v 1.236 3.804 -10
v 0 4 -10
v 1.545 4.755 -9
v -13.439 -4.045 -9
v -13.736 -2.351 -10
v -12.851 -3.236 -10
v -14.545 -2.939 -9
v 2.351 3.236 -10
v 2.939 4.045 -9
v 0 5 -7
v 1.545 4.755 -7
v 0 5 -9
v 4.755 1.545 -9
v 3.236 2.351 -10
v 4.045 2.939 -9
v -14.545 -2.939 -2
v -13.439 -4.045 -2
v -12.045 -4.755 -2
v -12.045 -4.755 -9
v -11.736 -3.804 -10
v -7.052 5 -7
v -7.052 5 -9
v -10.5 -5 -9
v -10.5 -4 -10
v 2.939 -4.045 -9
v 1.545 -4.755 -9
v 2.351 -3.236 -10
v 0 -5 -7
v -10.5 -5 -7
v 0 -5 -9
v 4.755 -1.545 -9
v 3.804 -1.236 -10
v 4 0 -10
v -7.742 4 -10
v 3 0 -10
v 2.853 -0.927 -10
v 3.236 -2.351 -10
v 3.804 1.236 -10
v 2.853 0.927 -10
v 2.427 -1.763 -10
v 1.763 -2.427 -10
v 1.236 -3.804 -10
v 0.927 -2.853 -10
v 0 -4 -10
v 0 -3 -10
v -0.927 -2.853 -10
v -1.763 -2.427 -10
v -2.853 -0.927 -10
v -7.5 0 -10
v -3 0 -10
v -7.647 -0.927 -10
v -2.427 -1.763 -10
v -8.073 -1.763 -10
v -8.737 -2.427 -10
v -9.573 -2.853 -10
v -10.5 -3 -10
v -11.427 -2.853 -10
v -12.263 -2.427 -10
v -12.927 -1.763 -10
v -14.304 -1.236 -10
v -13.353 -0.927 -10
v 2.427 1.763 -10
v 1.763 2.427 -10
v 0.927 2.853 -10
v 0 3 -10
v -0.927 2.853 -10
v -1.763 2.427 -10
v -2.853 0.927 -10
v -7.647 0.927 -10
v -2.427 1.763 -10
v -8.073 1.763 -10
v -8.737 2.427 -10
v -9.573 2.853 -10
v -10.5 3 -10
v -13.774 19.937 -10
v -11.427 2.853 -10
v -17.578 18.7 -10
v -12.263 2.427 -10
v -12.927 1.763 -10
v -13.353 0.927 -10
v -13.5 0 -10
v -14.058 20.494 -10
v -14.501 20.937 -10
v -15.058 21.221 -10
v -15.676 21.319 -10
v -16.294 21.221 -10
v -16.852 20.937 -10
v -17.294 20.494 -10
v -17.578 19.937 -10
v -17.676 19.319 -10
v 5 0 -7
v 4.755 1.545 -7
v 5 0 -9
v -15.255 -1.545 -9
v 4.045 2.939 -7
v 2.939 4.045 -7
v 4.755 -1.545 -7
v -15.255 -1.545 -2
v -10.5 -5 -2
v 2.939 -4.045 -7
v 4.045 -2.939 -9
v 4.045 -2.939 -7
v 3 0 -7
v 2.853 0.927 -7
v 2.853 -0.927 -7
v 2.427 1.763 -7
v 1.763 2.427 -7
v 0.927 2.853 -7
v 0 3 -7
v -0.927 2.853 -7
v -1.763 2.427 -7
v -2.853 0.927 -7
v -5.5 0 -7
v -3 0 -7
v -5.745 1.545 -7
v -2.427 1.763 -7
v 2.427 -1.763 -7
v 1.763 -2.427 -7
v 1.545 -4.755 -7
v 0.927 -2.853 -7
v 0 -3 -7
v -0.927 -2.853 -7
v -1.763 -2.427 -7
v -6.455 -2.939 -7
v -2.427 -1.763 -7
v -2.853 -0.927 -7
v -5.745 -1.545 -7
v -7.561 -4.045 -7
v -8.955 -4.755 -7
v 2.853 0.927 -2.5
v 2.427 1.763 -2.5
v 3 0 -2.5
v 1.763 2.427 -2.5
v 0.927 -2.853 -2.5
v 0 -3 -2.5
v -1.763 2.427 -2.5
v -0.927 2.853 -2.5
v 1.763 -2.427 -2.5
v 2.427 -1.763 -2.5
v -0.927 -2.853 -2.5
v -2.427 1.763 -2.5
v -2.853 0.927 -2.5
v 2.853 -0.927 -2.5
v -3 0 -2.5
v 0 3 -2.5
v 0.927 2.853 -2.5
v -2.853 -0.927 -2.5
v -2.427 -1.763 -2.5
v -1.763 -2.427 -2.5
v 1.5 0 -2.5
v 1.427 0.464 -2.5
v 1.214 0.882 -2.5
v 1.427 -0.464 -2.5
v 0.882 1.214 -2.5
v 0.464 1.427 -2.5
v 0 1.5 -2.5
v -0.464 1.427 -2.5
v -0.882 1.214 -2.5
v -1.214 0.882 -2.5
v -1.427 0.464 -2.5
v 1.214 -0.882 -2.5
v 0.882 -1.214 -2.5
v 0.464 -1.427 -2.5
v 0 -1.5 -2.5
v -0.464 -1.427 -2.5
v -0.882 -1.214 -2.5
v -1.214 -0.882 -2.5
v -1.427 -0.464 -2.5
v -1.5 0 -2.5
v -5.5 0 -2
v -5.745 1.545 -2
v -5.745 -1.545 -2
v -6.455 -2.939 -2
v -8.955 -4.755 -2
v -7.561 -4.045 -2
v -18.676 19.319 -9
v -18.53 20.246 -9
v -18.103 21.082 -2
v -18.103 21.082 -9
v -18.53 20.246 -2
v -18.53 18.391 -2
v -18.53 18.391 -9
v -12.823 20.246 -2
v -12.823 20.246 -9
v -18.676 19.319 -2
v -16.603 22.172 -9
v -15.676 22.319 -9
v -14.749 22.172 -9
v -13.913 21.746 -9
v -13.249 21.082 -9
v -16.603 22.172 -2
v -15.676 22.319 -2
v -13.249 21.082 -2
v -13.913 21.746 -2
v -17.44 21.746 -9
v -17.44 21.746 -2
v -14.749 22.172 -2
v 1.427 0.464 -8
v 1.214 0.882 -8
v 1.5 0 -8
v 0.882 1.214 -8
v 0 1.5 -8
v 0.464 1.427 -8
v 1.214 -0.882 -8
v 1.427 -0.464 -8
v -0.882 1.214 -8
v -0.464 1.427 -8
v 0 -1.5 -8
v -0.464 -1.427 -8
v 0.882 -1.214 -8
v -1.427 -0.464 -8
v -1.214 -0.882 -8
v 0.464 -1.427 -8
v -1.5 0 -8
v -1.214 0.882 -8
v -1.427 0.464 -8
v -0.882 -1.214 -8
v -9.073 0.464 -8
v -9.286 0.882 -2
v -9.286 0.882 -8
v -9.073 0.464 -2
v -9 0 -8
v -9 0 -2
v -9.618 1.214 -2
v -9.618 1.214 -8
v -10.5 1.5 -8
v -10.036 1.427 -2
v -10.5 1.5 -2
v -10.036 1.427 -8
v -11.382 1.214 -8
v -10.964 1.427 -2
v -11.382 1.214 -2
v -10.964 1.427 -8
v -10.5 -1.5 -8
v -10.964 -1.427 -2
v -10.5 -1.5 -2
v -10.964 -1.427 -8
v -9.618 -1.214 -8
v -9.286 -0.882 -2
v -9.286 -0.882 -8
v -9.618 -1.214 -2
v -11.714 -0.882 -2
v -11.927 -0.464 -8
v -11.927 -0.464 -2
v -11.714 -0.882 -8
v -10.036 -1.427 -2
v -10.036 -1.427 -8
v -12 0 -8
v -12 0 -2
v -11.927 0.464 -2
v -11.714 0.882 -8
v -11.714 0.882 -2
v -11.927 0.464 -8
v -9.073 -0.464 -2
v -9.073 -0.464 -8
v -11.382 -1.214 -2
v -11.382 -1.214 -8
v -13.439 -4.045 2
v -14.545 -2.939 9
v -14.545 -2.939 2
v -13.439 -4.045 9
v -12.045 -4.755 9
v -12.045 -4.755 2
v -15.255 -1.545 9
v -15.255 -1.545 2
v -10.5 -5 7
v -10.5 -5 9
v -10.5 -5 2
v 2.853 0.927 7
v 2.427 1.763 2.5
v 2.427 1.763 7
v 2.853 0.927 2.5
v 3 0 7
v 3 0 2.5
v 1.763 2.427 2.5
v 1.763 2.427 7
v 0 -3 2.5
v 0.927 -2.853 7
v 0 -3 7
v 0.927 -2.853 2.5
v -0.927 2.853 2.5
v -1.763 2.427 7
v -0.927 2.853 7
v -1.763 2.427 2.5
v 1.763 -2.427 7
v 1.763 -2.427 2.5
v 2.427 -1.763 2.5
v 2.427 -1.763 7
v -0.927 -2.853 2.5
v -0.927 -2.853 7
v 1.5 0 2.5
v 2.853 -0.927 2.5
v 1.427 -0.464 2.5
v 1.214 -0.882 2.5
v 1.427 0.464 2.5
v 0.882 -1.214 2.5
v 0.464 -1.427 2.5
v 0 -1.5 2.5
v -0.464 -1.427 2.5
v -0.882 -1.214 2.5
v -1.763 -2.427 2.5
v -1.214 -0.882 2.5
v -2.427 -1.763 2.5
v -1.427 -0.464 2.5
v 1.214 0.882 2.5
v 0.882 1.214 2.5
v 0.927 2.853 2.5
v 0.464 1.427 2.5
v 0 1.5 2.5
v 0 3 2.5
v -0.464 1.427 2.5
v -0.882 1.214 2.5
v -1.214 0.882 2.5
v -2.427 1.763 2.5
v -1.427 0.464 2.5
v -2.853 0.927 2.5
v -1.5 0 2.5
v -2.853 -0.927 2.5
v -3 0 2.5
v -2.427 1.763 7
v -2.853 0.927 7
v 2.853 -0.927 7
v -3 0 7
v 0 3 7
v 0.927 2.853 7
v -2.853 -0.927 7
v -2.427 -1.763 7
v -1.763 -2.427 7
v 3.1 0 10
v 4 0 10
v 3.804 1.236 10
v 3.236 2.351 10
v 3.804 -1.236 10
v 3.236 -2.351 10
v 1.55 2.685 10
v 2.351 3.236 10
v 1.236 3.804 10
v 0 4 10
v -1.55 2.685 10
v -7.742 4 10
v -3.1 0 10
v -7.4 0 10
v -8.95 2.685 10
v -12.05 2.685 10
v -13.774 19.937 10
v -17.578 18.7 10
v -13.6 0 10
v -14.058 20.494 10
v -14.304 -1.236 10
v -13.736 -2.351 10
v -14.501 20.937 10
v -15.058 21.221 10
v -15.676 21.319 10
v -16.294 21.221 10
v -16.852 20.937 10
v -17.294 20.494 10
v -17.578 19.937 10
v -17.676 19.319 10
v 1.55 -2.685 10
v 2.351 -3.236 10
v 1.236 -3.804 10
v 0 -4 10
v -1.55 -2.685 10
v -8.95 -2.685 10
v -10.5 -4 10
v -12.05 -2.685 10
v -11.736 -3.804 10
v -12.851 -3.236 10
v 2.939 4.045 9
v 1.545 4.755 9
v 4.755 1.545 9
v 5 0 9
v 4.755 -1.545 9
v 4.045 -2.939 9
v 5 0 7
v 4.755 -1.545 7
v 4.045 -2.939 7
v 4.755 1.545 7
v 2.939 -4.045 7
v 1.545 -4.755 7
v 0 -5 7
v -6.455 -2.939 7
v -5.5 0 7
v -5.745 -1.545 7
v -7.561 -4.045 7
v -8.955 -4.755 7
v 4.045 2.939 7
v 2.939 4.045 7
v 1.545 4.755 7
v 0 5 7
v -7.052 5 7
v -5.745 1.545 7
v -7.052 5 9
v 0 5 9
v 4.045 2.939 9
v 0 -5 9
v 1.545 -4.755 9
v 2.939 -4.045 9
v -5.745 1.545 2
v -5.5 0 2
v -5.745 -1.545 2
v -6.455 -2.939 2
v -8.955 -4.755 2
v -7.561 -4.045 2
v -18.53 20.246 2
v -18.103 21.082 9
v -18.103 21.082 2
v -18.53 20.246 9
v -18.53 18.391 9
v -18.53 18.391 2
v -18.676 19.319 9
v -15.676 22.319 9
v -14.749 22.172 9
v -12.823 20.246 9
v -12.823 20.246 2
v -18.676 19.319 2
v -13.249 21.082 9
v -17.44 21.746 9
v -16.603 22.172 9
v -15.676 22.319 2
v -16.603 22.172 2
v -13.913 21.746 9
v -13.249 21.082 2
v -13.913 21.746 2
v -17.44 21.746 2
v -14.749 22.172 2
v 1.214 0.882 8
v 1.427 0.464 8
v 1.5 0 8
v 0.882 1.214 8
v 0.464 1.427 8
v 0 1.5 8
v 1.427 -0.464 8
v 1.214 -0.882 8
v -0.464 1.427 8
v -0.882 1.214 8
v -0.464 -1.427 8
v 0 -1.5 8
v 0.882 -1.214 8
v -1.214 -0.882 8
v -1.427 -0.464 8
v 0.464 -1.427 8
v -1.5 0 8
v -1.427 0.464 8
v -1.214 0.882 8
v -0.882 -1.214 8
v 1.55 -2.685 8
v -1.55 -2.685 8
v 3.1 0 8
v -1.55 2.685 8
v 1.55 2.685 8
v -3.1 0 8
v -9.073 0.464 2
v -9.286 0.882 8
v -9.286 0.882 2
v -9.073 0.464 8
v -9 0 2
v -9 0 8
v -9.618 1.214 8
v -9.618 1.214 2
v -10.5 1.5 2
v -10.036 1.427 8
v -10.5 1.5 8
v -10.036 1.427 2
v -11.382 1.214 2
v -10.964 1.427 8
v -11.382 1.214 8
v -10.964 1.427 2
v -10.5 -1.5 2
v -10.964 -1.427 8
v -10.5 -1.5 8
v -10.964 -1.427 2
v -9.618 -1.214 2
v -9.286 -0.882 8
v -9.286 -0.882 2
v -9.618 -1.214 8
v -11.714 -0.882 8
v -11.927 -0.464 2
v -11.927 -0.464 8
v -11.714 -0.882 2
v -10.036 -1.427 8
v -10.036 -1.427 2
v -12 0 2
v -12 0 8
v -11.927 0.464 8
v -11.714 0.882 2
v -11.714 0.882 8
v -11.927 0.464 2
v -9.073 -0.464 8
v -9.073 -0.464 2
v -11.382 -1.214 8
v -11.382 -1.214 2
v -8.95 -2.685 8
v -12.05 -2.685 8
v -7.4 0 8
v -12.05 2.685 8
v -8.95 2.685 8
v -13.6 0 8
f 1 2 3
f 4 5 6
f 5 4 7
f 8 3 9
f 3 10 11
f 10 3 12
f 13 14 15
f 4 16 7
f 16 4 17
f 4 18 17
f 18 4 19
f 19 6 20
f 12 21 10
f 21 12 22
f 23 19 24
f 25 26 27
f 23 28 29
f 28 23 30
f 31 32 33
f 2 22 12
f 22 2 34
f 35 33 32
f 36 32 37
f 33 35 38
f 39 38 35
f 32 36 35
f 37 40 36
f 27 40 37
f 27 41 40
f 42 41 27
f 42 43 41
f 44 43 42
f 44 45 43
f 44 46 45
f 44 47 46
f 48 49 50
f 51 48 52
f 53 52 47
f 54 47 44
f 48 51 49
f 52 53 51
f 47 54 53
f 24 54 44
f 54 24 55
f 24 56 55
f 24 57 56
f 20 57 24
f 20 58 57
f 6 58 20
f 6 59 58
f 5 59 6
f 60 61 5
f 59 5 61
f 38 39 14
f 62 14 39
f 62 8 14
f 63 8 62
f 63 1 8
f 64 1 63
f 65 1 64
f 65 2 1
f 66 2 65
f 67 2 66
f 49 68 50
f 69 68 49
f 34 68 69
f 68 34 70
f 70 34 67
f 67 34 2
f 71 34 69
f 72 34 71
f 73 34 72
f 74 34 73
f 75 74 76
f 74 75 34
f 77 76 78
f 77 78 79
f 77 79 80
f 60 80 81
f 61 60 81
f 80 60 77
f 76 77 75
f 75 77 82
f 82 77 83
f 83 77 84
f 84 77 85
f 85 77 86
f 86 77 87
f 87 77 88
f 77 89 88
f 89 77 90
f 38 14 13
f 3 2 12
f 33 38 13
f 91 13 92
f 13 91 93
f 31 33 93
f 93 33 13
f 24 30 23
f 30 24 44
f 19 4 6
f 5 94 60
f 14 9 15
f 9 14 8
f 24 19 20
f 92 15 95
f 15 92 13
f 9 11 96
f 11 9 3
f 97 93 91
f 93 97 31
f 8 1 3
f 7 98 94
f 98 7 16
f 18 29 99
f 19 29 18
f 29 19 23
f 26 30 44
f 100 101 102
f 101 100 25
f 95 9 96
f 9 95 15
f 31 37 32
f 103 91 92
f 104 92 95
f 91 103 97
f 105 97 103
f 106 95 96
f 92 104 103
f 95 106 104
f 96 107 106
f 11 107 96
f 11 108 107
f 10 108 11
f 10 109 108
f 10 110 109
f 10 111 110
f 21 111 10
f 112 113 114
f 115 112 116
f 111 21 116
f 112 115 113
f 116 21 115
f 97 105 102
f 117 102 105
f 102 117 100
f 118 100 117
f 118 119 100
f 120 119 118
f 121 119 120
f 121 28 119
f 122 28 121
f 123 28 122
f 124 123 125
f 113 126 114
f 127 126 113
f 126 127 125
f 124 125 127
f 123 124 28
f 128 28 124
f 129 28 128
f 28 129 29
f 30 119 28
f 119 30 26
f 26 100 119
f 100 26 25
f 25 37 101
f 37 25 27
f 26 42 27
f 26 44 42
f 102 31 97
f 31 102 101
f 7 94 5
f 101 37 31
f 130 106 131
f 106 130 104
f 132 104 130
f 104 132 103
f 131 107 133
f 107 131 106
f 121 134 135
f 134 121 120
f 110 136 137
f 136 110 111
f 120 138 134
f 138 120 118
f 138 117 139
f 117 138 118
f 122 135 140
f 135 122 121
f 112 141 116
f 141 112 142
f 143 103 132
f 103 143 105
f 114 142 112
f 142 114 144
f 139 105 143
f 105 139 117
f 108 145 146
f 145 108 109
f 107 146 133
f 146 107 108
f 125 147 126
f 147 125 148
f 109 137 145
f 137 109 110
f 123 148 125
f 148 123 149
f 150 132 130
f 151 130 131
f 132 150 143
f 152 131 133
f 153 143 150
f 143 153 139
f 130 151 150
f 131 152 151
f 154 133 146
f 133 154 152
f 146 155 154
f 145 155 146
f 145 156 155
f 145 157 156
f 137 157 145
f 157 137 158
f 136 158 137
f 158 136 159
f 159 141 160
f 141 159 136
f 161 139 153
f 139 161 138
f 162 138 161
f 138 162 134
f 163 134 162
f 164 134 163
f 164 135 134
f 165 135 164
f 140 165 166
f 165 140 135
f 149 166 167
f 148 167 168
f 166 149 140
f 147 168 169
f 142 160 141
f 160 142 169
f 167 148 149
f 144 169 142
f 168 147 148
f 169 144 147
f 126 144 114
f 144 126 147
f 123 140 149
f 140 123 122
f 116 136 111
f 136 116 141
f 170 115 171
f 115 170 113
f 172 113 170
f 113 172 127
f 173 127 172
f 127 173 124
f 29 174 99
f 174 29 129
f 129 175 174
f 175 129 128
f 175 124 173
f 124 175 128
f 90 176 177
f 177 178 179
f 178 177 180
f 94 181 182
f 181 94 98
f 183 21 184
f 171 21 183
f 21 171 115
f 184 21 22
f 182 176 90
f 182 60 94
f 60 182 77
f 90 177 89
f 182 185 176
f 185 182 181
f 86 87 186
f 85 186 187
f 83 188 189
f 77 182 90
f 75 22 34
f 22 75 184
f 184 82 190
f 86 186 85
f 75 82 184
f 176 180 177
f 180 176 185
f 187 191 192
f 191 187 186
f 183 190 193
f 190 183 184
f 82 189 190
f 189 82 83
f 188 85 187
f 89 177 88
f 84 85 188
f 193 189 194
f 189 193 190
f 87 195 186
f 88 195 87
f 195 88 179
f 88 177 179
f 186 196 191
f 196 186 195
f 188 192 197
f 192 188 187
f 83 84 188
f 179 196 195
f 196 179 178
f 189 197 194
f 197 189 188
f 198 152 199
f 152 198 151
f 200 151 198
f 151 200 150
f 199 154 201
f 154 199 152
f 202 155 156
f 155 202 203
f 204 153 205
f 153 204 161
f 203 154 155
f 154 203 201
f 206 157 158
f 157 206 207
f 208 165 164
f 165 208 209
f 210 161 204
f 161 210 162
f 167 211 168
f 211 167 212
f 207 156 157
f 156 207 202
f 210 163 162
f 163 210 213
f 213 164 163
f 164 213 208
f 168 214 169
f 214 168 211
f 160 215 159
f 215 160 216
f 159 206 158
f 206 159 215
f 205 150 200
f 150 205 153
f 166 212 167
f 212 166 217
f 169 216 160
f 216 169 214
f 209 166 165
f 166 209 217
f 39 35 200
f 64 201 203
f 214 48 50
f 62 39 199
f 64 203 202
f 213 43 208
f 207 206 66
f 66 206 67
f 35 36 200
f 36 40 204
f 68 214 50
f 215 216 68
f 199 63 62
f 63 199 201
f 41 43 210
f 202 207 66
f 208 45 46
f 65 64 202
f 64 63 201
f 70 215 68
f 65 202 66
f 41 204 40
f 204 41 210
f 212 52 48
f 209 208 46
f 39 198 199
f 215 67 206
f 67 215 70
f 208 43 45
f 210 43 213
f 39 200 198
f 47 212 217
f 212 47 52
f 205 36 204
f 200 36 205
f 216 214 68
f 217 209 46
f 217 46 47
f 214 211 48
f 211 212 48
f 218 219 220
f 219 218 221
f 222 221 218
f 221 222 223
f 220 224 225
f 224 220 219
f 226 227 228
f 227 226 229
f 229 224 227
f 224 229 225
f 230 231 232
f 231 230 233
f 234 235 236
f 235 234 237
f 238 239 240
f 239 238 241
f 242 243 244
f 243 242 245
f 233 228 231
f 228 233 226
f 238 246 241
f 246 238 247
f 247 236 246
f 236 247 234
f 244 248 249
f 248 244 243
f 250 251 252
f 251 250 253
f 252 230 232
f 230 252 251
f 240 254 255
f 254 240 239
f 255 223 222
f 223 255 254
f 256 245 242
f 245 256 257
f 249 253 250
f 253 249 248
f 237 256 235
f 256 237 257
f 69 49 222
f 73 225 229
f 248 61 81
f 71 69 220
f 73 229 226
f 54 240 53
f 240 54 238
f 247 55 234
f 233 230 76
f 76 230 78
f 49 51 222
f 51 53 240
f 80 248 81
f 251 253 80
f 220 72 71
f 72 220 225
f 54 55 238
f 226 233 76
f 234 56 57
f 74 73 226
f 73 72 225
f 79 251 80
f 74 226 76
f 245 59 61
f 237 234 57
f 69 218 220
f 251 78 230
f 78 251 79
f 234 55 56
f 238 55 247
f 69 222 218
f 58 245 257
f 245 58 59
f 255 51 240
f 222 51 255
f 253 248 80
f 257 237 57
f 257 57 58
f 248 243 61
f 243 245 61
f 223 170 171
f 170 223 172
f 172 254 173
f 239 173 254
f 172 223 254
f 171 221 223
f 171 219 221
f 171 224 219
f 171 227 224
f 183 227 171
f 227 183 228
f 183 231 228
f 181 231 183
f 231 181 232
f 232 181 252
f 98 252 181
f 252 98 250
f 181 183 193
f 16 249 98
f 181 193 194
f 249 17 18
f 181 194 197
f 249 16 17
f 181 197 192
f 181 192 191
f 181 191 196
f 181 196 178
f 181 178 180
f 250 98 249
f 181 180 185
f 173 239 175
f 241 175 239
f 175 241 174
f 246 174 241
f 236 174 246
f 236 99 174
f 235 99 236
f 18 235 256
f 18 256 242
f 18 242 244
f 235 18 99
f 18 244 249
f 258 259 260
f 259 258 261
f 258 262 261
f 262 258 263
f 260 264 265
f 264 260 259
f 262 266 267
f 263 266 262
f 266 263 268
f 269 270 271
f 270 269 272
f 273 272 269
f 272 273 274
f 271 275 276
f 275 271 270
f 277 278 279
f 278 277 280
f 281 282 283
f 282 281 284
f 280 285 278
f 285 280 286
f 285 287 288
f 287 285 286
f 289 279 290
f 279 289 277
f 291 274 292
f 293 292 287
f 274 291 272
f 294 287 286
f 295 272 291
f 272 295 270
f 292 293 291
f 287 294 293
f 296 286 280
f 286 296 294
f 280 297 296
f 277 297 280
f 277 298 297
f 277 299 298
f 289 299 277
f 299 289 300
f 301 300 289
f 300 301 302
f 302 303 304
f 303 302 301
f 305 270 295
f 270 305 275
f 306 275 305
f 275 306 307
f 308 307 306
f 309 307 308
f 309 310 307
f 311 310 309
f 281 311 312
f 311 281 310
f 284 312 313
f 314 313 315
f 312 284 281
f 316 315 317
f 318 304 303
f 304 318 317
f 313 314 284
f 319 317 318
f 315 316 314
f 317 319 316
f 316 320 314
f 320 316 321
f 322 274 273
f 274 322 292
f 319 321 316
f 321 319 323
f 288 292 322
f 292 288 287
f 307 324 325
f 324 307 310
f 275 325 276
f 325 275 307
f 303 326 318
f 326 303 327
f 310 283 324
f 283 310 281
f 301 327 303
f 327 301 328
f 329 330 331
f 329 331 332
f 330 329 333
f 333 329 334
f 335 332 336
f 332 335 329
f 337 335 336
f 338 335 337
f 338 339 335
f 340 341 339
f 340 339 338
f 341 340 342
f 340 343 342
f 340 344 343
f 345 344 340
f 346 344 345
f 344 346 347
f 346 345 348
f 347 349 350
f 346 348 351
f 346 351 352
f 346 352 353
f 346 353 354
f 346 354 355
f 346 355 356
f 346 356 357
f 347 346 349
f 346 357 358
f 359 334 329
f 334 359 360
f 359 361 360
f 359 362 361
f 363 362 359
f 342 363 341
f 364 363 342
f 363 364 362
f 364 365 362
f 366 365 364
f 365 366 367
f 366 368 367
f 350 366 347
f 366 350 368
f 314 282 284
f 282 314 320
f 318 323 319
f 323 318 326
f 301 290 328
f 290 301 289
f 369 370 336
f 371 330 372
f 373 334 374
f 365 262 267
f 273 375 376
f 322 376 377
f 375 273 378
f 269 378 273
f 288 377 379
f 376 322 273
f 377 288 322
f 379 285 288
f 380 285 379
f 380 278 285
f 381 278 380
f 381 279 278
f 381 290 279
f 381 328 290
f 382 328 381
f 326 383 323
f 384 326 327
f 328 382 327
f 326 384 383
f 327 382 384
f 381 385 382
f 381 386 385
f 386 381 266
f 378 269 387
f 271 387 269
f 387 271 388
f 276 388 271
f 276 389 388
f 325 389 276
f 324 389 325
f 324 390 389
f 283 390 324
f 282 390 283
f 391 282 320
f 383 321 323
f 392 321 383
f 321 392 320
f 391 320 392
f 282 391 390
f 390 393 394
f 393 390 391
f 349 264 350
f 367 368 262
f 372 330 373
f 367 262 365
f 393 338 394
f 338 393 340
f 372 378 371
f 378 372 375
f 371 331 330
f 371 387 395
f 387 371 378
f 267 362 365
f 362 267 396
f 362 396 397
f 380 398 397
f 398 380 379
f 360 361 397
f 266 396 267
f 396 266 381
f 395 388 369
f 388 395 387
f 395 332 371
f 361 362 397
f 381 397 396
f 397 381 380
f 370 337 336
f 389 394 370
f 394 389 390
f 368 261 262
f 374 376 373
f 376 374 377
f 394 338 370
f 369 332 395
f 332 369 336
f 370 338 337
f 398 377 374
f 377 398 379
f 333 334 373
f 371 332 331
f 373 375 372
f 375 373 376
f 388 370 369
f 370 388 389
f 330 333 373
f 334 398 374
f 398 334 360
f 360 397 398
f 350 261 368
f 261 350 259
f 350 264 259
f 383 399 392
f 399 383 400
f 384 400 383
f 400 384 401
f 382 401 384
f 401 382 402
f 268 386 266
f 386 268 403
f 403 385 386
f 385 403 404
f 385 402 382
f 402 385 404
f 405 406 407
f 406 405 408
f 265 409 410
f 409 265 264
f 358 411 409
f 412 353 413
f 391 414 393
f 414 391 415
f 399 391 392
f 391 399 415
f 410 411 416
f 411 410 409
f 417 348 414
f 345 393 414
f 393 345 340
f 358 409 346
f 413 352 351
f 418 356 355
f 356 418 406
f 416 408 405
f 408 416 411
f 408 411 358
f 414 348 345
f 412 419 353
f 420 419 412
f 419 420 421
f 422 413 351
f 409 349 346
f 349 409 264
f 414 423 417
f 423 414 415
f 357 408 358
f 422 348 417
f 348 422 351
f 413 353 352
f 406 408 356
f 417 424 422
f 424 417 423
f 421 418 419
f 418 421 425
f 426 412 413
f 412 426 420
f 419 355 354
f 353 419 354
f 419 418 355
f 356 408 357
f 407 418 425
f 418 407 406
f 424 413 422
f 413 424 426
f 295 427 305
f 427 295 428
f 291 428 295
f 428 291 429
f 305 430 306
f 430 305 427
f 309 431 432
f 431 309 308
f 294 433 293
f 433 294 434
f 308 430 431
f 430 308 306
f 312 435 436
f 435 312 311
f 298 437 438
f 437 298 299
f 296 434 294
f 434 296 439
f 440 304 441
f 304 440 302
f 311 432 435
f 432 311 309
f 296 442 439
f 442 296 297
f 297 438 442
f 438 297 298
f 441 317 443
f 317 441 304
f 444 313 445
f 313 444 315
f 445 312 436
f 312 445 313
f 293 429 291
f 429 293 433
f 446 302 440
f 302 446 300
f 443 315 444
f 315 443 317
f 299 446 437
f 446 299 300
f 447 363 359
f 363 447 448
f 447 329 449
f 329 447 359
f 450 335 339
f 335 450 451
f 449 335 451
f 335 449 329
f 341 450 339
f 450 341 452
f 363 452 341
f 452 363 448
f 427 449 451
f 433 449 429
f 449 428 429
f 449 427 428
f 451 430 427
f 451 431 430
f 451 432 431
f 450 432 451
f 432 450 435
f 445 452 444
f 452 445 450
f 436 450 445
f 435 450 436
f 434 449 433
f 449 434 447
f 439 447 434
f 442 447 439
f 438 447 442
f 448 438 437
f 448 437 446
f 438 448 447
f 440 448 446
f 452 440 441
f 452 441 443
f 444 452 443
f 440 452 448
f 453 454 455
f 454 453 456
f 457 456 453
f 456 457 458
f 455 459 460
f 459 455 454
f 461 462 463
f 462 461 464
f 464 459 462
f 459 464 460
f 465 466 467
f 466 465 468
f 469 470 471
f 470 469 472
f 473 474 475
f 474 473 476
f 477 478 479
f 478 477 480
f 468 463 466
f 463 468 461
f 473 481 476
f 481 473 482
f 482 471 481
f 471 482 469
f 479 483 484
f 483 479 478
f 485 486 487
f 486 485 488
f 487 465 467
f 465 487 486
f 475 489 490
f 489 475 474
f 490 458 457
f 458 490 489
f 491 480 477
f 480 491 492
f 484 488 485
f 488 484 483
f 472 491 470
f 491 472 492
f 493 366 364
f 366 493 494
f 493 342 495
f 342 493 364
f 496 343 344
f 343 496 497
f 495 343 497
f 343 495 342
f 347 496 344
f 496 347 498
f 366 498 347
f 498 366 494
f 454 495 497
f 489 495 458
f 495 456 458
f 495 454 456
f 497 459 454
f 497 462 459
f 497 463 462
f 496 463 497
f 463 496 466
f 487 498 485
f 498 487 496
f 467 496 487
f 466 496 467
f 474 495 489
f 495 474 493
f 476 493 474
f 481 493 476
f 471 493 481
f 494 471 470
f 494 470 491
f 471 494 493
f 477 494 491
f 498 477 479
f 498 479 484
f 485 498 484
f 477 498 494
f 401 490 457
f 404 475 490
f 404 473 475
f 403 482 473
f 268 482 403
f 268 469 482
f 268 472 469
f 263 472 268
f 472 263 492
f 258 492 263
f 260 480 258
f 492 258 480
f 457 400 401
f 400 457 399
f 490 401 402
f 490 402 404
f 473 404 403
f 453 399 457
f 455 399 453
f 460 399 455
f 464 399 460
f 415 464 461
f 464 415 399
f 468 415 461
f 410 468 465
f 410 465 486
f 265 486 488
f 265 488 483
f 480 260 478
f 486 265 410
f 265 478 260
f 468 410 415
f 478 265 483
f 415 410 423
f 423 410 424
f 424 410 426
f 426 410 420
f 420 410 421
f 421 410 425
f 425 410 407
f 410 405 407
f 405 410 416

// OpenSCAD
/**
 * Martin Egli
 * 2020-09-28
 */
res = 20;

module holderD() {
    difference() {
        hull() {
            translate([0,0,1])
            cylinder(d=10, h=8, $fn=res);
            translate([0,0,0])
            cylinder(d=8, h=10, $fn=res);
        
            translate([0, -5, 1])
            cube([30, 10, 8]);
            translate([0, -4, 0])
            cube([30, 8, 10]);
            translate([30, -4, 1])
            cube([1, 8, 8]);
        }
        // 6 mm pipe
        translate([0,0,-1])
        cylinder(d=6, h=12, $fn=res);
        
        translate([2, -1, -1])
        cube([10, 2, 12]);
        
        // M3 screw and nut cut out
        translate([7,6,5])
        rotate([90,0,0]) {
        cylinder(d=3, h = 12, $fn= res);
            translate([0,0,1])
            cylinder(d1=6, d2=3, h = 2, $fn= res);
            
            translate([0,0,9])
            cylinder(d=6.2, h = 2, $fn= 6);
        }
        
        // 6 mm pipe
        translate([15,0,5])
        rotate([0,90,0])
        cylinder(d=6, h = 16, $fn= res);        
        
        // M3 screw and nut cut out
        translate([23,6,5])
        rotate([90,0,0]) {
            cylinder(d=3, h = 12, $fn= res);
            translate([0,0,1])
            cylinder(d1=6, d2=3, h = 2, $fn= res);
            
            translate([0,0,9])
            cylinder(d=6.2, h = 2, $fn= 6);
        }
        
        translate([-5, 0, -5])
        cube(40);
    }
}

module holderEAll() {
    difference() {
        union() {
            hull() {
                translate([0,0,1])
                cylinder(d=10, h=2, $fn=res);
                translate([-10.5,0,1])
                cylinder(d=10, h=2, $fn=res);
                translate([0,0,0])
                cylinder(d=8, h=1, $fn=res);
                translate([-10.5,0,0])
                cylinder(d=8, h=1, $fn=res);
            }
            
            // 6 mm axis top
            translate([0,0,0])
            cylinder(d=6, h=7.5, $fn=res);
            // 6 mm axis bottom
            translate([0,0,8.5])
            cylinder(d=6, h=7.5, $fn=res);
            
            hull() {
                translate([0,0,13])
                cylinder(d=10, h=2, $fn=res);
                translate([-10.5,0,13])
                cylinder(d=10, h=2, $fn=res);
                translate([0,0,15])
                cylinder(d=8, h=1, $fn=res);
                translate([-10.5,0,15])
                cylinder(d=8, h=1, $fn=res);
            }
            
            translate([-10.5,0,1])
            cylinder(d=10, h=14, $fn=res);
            
            hull(){
                translate([-10.5,0,0]) {
                    translate([0,0,0])
                    cylinder(d=8, h=1, $fn=res);
                    translate([0,0,1])
                    cylinder(d=10, h=14, $fn=res);
                    translate([0,0,15])
                    cylinder(d=8, h=1, $fn=res);
                }
                
                translate([-10.5-(20*cos(75)),(20*sin(75)),0]) {
                    translate([0,0,0])
                    cylinder(d=4, h=1, $fn=res);
                    translate([0,0,1])
                    cylinder(d=6, h=14, $fn=res);
                    translate([0,0,15])
                    cylinder(d=4, h=1, $fn=res);
                }
            }
        }
    
        // M3 screw and nut cut out
        translate([0,0,-1]) {
        //rotate([90,0,0]) {
            cylinder(d=3, h = 18, $fn= res);
            translate([0,0,1])
            cylinder(d1=6, d2=3, h = 2, $fn= res);
            
            translate([0,0,15])
            cylinder(d=6.2, h = 2, $fn= 6);
        }
        // M3 screw and nut cut out
        translate([-10.5,0,-1]) {
        //rotate([90,0,0]) {
            cylinder(d=3, h = 18, $fn= res);
            translate([0,0,1])
            cylinder(d1=6, d2=3, h = 2, $fn= res);
            
            translate([0,0,15])
            cylinder(d=6.2, h = 2, $fn= 6);
        }
    }
}

module holderELeft() {
    difference() {
        translate([0,0,-8])
        holderEAll();
        translate([-25, -25, 0])
        cube(50);
    }
}

module holderERight() {
    difference() {
        translate([0,0,-8])
        holderEAll();
        translate([-25, -25, -50])
        cube(50);
    }
}

//holderD();
//translate([0,0,-3]) holderEAll();
translate([0,0,-2]) holderELeft();
translate([0,0,+2]) holderERight();
